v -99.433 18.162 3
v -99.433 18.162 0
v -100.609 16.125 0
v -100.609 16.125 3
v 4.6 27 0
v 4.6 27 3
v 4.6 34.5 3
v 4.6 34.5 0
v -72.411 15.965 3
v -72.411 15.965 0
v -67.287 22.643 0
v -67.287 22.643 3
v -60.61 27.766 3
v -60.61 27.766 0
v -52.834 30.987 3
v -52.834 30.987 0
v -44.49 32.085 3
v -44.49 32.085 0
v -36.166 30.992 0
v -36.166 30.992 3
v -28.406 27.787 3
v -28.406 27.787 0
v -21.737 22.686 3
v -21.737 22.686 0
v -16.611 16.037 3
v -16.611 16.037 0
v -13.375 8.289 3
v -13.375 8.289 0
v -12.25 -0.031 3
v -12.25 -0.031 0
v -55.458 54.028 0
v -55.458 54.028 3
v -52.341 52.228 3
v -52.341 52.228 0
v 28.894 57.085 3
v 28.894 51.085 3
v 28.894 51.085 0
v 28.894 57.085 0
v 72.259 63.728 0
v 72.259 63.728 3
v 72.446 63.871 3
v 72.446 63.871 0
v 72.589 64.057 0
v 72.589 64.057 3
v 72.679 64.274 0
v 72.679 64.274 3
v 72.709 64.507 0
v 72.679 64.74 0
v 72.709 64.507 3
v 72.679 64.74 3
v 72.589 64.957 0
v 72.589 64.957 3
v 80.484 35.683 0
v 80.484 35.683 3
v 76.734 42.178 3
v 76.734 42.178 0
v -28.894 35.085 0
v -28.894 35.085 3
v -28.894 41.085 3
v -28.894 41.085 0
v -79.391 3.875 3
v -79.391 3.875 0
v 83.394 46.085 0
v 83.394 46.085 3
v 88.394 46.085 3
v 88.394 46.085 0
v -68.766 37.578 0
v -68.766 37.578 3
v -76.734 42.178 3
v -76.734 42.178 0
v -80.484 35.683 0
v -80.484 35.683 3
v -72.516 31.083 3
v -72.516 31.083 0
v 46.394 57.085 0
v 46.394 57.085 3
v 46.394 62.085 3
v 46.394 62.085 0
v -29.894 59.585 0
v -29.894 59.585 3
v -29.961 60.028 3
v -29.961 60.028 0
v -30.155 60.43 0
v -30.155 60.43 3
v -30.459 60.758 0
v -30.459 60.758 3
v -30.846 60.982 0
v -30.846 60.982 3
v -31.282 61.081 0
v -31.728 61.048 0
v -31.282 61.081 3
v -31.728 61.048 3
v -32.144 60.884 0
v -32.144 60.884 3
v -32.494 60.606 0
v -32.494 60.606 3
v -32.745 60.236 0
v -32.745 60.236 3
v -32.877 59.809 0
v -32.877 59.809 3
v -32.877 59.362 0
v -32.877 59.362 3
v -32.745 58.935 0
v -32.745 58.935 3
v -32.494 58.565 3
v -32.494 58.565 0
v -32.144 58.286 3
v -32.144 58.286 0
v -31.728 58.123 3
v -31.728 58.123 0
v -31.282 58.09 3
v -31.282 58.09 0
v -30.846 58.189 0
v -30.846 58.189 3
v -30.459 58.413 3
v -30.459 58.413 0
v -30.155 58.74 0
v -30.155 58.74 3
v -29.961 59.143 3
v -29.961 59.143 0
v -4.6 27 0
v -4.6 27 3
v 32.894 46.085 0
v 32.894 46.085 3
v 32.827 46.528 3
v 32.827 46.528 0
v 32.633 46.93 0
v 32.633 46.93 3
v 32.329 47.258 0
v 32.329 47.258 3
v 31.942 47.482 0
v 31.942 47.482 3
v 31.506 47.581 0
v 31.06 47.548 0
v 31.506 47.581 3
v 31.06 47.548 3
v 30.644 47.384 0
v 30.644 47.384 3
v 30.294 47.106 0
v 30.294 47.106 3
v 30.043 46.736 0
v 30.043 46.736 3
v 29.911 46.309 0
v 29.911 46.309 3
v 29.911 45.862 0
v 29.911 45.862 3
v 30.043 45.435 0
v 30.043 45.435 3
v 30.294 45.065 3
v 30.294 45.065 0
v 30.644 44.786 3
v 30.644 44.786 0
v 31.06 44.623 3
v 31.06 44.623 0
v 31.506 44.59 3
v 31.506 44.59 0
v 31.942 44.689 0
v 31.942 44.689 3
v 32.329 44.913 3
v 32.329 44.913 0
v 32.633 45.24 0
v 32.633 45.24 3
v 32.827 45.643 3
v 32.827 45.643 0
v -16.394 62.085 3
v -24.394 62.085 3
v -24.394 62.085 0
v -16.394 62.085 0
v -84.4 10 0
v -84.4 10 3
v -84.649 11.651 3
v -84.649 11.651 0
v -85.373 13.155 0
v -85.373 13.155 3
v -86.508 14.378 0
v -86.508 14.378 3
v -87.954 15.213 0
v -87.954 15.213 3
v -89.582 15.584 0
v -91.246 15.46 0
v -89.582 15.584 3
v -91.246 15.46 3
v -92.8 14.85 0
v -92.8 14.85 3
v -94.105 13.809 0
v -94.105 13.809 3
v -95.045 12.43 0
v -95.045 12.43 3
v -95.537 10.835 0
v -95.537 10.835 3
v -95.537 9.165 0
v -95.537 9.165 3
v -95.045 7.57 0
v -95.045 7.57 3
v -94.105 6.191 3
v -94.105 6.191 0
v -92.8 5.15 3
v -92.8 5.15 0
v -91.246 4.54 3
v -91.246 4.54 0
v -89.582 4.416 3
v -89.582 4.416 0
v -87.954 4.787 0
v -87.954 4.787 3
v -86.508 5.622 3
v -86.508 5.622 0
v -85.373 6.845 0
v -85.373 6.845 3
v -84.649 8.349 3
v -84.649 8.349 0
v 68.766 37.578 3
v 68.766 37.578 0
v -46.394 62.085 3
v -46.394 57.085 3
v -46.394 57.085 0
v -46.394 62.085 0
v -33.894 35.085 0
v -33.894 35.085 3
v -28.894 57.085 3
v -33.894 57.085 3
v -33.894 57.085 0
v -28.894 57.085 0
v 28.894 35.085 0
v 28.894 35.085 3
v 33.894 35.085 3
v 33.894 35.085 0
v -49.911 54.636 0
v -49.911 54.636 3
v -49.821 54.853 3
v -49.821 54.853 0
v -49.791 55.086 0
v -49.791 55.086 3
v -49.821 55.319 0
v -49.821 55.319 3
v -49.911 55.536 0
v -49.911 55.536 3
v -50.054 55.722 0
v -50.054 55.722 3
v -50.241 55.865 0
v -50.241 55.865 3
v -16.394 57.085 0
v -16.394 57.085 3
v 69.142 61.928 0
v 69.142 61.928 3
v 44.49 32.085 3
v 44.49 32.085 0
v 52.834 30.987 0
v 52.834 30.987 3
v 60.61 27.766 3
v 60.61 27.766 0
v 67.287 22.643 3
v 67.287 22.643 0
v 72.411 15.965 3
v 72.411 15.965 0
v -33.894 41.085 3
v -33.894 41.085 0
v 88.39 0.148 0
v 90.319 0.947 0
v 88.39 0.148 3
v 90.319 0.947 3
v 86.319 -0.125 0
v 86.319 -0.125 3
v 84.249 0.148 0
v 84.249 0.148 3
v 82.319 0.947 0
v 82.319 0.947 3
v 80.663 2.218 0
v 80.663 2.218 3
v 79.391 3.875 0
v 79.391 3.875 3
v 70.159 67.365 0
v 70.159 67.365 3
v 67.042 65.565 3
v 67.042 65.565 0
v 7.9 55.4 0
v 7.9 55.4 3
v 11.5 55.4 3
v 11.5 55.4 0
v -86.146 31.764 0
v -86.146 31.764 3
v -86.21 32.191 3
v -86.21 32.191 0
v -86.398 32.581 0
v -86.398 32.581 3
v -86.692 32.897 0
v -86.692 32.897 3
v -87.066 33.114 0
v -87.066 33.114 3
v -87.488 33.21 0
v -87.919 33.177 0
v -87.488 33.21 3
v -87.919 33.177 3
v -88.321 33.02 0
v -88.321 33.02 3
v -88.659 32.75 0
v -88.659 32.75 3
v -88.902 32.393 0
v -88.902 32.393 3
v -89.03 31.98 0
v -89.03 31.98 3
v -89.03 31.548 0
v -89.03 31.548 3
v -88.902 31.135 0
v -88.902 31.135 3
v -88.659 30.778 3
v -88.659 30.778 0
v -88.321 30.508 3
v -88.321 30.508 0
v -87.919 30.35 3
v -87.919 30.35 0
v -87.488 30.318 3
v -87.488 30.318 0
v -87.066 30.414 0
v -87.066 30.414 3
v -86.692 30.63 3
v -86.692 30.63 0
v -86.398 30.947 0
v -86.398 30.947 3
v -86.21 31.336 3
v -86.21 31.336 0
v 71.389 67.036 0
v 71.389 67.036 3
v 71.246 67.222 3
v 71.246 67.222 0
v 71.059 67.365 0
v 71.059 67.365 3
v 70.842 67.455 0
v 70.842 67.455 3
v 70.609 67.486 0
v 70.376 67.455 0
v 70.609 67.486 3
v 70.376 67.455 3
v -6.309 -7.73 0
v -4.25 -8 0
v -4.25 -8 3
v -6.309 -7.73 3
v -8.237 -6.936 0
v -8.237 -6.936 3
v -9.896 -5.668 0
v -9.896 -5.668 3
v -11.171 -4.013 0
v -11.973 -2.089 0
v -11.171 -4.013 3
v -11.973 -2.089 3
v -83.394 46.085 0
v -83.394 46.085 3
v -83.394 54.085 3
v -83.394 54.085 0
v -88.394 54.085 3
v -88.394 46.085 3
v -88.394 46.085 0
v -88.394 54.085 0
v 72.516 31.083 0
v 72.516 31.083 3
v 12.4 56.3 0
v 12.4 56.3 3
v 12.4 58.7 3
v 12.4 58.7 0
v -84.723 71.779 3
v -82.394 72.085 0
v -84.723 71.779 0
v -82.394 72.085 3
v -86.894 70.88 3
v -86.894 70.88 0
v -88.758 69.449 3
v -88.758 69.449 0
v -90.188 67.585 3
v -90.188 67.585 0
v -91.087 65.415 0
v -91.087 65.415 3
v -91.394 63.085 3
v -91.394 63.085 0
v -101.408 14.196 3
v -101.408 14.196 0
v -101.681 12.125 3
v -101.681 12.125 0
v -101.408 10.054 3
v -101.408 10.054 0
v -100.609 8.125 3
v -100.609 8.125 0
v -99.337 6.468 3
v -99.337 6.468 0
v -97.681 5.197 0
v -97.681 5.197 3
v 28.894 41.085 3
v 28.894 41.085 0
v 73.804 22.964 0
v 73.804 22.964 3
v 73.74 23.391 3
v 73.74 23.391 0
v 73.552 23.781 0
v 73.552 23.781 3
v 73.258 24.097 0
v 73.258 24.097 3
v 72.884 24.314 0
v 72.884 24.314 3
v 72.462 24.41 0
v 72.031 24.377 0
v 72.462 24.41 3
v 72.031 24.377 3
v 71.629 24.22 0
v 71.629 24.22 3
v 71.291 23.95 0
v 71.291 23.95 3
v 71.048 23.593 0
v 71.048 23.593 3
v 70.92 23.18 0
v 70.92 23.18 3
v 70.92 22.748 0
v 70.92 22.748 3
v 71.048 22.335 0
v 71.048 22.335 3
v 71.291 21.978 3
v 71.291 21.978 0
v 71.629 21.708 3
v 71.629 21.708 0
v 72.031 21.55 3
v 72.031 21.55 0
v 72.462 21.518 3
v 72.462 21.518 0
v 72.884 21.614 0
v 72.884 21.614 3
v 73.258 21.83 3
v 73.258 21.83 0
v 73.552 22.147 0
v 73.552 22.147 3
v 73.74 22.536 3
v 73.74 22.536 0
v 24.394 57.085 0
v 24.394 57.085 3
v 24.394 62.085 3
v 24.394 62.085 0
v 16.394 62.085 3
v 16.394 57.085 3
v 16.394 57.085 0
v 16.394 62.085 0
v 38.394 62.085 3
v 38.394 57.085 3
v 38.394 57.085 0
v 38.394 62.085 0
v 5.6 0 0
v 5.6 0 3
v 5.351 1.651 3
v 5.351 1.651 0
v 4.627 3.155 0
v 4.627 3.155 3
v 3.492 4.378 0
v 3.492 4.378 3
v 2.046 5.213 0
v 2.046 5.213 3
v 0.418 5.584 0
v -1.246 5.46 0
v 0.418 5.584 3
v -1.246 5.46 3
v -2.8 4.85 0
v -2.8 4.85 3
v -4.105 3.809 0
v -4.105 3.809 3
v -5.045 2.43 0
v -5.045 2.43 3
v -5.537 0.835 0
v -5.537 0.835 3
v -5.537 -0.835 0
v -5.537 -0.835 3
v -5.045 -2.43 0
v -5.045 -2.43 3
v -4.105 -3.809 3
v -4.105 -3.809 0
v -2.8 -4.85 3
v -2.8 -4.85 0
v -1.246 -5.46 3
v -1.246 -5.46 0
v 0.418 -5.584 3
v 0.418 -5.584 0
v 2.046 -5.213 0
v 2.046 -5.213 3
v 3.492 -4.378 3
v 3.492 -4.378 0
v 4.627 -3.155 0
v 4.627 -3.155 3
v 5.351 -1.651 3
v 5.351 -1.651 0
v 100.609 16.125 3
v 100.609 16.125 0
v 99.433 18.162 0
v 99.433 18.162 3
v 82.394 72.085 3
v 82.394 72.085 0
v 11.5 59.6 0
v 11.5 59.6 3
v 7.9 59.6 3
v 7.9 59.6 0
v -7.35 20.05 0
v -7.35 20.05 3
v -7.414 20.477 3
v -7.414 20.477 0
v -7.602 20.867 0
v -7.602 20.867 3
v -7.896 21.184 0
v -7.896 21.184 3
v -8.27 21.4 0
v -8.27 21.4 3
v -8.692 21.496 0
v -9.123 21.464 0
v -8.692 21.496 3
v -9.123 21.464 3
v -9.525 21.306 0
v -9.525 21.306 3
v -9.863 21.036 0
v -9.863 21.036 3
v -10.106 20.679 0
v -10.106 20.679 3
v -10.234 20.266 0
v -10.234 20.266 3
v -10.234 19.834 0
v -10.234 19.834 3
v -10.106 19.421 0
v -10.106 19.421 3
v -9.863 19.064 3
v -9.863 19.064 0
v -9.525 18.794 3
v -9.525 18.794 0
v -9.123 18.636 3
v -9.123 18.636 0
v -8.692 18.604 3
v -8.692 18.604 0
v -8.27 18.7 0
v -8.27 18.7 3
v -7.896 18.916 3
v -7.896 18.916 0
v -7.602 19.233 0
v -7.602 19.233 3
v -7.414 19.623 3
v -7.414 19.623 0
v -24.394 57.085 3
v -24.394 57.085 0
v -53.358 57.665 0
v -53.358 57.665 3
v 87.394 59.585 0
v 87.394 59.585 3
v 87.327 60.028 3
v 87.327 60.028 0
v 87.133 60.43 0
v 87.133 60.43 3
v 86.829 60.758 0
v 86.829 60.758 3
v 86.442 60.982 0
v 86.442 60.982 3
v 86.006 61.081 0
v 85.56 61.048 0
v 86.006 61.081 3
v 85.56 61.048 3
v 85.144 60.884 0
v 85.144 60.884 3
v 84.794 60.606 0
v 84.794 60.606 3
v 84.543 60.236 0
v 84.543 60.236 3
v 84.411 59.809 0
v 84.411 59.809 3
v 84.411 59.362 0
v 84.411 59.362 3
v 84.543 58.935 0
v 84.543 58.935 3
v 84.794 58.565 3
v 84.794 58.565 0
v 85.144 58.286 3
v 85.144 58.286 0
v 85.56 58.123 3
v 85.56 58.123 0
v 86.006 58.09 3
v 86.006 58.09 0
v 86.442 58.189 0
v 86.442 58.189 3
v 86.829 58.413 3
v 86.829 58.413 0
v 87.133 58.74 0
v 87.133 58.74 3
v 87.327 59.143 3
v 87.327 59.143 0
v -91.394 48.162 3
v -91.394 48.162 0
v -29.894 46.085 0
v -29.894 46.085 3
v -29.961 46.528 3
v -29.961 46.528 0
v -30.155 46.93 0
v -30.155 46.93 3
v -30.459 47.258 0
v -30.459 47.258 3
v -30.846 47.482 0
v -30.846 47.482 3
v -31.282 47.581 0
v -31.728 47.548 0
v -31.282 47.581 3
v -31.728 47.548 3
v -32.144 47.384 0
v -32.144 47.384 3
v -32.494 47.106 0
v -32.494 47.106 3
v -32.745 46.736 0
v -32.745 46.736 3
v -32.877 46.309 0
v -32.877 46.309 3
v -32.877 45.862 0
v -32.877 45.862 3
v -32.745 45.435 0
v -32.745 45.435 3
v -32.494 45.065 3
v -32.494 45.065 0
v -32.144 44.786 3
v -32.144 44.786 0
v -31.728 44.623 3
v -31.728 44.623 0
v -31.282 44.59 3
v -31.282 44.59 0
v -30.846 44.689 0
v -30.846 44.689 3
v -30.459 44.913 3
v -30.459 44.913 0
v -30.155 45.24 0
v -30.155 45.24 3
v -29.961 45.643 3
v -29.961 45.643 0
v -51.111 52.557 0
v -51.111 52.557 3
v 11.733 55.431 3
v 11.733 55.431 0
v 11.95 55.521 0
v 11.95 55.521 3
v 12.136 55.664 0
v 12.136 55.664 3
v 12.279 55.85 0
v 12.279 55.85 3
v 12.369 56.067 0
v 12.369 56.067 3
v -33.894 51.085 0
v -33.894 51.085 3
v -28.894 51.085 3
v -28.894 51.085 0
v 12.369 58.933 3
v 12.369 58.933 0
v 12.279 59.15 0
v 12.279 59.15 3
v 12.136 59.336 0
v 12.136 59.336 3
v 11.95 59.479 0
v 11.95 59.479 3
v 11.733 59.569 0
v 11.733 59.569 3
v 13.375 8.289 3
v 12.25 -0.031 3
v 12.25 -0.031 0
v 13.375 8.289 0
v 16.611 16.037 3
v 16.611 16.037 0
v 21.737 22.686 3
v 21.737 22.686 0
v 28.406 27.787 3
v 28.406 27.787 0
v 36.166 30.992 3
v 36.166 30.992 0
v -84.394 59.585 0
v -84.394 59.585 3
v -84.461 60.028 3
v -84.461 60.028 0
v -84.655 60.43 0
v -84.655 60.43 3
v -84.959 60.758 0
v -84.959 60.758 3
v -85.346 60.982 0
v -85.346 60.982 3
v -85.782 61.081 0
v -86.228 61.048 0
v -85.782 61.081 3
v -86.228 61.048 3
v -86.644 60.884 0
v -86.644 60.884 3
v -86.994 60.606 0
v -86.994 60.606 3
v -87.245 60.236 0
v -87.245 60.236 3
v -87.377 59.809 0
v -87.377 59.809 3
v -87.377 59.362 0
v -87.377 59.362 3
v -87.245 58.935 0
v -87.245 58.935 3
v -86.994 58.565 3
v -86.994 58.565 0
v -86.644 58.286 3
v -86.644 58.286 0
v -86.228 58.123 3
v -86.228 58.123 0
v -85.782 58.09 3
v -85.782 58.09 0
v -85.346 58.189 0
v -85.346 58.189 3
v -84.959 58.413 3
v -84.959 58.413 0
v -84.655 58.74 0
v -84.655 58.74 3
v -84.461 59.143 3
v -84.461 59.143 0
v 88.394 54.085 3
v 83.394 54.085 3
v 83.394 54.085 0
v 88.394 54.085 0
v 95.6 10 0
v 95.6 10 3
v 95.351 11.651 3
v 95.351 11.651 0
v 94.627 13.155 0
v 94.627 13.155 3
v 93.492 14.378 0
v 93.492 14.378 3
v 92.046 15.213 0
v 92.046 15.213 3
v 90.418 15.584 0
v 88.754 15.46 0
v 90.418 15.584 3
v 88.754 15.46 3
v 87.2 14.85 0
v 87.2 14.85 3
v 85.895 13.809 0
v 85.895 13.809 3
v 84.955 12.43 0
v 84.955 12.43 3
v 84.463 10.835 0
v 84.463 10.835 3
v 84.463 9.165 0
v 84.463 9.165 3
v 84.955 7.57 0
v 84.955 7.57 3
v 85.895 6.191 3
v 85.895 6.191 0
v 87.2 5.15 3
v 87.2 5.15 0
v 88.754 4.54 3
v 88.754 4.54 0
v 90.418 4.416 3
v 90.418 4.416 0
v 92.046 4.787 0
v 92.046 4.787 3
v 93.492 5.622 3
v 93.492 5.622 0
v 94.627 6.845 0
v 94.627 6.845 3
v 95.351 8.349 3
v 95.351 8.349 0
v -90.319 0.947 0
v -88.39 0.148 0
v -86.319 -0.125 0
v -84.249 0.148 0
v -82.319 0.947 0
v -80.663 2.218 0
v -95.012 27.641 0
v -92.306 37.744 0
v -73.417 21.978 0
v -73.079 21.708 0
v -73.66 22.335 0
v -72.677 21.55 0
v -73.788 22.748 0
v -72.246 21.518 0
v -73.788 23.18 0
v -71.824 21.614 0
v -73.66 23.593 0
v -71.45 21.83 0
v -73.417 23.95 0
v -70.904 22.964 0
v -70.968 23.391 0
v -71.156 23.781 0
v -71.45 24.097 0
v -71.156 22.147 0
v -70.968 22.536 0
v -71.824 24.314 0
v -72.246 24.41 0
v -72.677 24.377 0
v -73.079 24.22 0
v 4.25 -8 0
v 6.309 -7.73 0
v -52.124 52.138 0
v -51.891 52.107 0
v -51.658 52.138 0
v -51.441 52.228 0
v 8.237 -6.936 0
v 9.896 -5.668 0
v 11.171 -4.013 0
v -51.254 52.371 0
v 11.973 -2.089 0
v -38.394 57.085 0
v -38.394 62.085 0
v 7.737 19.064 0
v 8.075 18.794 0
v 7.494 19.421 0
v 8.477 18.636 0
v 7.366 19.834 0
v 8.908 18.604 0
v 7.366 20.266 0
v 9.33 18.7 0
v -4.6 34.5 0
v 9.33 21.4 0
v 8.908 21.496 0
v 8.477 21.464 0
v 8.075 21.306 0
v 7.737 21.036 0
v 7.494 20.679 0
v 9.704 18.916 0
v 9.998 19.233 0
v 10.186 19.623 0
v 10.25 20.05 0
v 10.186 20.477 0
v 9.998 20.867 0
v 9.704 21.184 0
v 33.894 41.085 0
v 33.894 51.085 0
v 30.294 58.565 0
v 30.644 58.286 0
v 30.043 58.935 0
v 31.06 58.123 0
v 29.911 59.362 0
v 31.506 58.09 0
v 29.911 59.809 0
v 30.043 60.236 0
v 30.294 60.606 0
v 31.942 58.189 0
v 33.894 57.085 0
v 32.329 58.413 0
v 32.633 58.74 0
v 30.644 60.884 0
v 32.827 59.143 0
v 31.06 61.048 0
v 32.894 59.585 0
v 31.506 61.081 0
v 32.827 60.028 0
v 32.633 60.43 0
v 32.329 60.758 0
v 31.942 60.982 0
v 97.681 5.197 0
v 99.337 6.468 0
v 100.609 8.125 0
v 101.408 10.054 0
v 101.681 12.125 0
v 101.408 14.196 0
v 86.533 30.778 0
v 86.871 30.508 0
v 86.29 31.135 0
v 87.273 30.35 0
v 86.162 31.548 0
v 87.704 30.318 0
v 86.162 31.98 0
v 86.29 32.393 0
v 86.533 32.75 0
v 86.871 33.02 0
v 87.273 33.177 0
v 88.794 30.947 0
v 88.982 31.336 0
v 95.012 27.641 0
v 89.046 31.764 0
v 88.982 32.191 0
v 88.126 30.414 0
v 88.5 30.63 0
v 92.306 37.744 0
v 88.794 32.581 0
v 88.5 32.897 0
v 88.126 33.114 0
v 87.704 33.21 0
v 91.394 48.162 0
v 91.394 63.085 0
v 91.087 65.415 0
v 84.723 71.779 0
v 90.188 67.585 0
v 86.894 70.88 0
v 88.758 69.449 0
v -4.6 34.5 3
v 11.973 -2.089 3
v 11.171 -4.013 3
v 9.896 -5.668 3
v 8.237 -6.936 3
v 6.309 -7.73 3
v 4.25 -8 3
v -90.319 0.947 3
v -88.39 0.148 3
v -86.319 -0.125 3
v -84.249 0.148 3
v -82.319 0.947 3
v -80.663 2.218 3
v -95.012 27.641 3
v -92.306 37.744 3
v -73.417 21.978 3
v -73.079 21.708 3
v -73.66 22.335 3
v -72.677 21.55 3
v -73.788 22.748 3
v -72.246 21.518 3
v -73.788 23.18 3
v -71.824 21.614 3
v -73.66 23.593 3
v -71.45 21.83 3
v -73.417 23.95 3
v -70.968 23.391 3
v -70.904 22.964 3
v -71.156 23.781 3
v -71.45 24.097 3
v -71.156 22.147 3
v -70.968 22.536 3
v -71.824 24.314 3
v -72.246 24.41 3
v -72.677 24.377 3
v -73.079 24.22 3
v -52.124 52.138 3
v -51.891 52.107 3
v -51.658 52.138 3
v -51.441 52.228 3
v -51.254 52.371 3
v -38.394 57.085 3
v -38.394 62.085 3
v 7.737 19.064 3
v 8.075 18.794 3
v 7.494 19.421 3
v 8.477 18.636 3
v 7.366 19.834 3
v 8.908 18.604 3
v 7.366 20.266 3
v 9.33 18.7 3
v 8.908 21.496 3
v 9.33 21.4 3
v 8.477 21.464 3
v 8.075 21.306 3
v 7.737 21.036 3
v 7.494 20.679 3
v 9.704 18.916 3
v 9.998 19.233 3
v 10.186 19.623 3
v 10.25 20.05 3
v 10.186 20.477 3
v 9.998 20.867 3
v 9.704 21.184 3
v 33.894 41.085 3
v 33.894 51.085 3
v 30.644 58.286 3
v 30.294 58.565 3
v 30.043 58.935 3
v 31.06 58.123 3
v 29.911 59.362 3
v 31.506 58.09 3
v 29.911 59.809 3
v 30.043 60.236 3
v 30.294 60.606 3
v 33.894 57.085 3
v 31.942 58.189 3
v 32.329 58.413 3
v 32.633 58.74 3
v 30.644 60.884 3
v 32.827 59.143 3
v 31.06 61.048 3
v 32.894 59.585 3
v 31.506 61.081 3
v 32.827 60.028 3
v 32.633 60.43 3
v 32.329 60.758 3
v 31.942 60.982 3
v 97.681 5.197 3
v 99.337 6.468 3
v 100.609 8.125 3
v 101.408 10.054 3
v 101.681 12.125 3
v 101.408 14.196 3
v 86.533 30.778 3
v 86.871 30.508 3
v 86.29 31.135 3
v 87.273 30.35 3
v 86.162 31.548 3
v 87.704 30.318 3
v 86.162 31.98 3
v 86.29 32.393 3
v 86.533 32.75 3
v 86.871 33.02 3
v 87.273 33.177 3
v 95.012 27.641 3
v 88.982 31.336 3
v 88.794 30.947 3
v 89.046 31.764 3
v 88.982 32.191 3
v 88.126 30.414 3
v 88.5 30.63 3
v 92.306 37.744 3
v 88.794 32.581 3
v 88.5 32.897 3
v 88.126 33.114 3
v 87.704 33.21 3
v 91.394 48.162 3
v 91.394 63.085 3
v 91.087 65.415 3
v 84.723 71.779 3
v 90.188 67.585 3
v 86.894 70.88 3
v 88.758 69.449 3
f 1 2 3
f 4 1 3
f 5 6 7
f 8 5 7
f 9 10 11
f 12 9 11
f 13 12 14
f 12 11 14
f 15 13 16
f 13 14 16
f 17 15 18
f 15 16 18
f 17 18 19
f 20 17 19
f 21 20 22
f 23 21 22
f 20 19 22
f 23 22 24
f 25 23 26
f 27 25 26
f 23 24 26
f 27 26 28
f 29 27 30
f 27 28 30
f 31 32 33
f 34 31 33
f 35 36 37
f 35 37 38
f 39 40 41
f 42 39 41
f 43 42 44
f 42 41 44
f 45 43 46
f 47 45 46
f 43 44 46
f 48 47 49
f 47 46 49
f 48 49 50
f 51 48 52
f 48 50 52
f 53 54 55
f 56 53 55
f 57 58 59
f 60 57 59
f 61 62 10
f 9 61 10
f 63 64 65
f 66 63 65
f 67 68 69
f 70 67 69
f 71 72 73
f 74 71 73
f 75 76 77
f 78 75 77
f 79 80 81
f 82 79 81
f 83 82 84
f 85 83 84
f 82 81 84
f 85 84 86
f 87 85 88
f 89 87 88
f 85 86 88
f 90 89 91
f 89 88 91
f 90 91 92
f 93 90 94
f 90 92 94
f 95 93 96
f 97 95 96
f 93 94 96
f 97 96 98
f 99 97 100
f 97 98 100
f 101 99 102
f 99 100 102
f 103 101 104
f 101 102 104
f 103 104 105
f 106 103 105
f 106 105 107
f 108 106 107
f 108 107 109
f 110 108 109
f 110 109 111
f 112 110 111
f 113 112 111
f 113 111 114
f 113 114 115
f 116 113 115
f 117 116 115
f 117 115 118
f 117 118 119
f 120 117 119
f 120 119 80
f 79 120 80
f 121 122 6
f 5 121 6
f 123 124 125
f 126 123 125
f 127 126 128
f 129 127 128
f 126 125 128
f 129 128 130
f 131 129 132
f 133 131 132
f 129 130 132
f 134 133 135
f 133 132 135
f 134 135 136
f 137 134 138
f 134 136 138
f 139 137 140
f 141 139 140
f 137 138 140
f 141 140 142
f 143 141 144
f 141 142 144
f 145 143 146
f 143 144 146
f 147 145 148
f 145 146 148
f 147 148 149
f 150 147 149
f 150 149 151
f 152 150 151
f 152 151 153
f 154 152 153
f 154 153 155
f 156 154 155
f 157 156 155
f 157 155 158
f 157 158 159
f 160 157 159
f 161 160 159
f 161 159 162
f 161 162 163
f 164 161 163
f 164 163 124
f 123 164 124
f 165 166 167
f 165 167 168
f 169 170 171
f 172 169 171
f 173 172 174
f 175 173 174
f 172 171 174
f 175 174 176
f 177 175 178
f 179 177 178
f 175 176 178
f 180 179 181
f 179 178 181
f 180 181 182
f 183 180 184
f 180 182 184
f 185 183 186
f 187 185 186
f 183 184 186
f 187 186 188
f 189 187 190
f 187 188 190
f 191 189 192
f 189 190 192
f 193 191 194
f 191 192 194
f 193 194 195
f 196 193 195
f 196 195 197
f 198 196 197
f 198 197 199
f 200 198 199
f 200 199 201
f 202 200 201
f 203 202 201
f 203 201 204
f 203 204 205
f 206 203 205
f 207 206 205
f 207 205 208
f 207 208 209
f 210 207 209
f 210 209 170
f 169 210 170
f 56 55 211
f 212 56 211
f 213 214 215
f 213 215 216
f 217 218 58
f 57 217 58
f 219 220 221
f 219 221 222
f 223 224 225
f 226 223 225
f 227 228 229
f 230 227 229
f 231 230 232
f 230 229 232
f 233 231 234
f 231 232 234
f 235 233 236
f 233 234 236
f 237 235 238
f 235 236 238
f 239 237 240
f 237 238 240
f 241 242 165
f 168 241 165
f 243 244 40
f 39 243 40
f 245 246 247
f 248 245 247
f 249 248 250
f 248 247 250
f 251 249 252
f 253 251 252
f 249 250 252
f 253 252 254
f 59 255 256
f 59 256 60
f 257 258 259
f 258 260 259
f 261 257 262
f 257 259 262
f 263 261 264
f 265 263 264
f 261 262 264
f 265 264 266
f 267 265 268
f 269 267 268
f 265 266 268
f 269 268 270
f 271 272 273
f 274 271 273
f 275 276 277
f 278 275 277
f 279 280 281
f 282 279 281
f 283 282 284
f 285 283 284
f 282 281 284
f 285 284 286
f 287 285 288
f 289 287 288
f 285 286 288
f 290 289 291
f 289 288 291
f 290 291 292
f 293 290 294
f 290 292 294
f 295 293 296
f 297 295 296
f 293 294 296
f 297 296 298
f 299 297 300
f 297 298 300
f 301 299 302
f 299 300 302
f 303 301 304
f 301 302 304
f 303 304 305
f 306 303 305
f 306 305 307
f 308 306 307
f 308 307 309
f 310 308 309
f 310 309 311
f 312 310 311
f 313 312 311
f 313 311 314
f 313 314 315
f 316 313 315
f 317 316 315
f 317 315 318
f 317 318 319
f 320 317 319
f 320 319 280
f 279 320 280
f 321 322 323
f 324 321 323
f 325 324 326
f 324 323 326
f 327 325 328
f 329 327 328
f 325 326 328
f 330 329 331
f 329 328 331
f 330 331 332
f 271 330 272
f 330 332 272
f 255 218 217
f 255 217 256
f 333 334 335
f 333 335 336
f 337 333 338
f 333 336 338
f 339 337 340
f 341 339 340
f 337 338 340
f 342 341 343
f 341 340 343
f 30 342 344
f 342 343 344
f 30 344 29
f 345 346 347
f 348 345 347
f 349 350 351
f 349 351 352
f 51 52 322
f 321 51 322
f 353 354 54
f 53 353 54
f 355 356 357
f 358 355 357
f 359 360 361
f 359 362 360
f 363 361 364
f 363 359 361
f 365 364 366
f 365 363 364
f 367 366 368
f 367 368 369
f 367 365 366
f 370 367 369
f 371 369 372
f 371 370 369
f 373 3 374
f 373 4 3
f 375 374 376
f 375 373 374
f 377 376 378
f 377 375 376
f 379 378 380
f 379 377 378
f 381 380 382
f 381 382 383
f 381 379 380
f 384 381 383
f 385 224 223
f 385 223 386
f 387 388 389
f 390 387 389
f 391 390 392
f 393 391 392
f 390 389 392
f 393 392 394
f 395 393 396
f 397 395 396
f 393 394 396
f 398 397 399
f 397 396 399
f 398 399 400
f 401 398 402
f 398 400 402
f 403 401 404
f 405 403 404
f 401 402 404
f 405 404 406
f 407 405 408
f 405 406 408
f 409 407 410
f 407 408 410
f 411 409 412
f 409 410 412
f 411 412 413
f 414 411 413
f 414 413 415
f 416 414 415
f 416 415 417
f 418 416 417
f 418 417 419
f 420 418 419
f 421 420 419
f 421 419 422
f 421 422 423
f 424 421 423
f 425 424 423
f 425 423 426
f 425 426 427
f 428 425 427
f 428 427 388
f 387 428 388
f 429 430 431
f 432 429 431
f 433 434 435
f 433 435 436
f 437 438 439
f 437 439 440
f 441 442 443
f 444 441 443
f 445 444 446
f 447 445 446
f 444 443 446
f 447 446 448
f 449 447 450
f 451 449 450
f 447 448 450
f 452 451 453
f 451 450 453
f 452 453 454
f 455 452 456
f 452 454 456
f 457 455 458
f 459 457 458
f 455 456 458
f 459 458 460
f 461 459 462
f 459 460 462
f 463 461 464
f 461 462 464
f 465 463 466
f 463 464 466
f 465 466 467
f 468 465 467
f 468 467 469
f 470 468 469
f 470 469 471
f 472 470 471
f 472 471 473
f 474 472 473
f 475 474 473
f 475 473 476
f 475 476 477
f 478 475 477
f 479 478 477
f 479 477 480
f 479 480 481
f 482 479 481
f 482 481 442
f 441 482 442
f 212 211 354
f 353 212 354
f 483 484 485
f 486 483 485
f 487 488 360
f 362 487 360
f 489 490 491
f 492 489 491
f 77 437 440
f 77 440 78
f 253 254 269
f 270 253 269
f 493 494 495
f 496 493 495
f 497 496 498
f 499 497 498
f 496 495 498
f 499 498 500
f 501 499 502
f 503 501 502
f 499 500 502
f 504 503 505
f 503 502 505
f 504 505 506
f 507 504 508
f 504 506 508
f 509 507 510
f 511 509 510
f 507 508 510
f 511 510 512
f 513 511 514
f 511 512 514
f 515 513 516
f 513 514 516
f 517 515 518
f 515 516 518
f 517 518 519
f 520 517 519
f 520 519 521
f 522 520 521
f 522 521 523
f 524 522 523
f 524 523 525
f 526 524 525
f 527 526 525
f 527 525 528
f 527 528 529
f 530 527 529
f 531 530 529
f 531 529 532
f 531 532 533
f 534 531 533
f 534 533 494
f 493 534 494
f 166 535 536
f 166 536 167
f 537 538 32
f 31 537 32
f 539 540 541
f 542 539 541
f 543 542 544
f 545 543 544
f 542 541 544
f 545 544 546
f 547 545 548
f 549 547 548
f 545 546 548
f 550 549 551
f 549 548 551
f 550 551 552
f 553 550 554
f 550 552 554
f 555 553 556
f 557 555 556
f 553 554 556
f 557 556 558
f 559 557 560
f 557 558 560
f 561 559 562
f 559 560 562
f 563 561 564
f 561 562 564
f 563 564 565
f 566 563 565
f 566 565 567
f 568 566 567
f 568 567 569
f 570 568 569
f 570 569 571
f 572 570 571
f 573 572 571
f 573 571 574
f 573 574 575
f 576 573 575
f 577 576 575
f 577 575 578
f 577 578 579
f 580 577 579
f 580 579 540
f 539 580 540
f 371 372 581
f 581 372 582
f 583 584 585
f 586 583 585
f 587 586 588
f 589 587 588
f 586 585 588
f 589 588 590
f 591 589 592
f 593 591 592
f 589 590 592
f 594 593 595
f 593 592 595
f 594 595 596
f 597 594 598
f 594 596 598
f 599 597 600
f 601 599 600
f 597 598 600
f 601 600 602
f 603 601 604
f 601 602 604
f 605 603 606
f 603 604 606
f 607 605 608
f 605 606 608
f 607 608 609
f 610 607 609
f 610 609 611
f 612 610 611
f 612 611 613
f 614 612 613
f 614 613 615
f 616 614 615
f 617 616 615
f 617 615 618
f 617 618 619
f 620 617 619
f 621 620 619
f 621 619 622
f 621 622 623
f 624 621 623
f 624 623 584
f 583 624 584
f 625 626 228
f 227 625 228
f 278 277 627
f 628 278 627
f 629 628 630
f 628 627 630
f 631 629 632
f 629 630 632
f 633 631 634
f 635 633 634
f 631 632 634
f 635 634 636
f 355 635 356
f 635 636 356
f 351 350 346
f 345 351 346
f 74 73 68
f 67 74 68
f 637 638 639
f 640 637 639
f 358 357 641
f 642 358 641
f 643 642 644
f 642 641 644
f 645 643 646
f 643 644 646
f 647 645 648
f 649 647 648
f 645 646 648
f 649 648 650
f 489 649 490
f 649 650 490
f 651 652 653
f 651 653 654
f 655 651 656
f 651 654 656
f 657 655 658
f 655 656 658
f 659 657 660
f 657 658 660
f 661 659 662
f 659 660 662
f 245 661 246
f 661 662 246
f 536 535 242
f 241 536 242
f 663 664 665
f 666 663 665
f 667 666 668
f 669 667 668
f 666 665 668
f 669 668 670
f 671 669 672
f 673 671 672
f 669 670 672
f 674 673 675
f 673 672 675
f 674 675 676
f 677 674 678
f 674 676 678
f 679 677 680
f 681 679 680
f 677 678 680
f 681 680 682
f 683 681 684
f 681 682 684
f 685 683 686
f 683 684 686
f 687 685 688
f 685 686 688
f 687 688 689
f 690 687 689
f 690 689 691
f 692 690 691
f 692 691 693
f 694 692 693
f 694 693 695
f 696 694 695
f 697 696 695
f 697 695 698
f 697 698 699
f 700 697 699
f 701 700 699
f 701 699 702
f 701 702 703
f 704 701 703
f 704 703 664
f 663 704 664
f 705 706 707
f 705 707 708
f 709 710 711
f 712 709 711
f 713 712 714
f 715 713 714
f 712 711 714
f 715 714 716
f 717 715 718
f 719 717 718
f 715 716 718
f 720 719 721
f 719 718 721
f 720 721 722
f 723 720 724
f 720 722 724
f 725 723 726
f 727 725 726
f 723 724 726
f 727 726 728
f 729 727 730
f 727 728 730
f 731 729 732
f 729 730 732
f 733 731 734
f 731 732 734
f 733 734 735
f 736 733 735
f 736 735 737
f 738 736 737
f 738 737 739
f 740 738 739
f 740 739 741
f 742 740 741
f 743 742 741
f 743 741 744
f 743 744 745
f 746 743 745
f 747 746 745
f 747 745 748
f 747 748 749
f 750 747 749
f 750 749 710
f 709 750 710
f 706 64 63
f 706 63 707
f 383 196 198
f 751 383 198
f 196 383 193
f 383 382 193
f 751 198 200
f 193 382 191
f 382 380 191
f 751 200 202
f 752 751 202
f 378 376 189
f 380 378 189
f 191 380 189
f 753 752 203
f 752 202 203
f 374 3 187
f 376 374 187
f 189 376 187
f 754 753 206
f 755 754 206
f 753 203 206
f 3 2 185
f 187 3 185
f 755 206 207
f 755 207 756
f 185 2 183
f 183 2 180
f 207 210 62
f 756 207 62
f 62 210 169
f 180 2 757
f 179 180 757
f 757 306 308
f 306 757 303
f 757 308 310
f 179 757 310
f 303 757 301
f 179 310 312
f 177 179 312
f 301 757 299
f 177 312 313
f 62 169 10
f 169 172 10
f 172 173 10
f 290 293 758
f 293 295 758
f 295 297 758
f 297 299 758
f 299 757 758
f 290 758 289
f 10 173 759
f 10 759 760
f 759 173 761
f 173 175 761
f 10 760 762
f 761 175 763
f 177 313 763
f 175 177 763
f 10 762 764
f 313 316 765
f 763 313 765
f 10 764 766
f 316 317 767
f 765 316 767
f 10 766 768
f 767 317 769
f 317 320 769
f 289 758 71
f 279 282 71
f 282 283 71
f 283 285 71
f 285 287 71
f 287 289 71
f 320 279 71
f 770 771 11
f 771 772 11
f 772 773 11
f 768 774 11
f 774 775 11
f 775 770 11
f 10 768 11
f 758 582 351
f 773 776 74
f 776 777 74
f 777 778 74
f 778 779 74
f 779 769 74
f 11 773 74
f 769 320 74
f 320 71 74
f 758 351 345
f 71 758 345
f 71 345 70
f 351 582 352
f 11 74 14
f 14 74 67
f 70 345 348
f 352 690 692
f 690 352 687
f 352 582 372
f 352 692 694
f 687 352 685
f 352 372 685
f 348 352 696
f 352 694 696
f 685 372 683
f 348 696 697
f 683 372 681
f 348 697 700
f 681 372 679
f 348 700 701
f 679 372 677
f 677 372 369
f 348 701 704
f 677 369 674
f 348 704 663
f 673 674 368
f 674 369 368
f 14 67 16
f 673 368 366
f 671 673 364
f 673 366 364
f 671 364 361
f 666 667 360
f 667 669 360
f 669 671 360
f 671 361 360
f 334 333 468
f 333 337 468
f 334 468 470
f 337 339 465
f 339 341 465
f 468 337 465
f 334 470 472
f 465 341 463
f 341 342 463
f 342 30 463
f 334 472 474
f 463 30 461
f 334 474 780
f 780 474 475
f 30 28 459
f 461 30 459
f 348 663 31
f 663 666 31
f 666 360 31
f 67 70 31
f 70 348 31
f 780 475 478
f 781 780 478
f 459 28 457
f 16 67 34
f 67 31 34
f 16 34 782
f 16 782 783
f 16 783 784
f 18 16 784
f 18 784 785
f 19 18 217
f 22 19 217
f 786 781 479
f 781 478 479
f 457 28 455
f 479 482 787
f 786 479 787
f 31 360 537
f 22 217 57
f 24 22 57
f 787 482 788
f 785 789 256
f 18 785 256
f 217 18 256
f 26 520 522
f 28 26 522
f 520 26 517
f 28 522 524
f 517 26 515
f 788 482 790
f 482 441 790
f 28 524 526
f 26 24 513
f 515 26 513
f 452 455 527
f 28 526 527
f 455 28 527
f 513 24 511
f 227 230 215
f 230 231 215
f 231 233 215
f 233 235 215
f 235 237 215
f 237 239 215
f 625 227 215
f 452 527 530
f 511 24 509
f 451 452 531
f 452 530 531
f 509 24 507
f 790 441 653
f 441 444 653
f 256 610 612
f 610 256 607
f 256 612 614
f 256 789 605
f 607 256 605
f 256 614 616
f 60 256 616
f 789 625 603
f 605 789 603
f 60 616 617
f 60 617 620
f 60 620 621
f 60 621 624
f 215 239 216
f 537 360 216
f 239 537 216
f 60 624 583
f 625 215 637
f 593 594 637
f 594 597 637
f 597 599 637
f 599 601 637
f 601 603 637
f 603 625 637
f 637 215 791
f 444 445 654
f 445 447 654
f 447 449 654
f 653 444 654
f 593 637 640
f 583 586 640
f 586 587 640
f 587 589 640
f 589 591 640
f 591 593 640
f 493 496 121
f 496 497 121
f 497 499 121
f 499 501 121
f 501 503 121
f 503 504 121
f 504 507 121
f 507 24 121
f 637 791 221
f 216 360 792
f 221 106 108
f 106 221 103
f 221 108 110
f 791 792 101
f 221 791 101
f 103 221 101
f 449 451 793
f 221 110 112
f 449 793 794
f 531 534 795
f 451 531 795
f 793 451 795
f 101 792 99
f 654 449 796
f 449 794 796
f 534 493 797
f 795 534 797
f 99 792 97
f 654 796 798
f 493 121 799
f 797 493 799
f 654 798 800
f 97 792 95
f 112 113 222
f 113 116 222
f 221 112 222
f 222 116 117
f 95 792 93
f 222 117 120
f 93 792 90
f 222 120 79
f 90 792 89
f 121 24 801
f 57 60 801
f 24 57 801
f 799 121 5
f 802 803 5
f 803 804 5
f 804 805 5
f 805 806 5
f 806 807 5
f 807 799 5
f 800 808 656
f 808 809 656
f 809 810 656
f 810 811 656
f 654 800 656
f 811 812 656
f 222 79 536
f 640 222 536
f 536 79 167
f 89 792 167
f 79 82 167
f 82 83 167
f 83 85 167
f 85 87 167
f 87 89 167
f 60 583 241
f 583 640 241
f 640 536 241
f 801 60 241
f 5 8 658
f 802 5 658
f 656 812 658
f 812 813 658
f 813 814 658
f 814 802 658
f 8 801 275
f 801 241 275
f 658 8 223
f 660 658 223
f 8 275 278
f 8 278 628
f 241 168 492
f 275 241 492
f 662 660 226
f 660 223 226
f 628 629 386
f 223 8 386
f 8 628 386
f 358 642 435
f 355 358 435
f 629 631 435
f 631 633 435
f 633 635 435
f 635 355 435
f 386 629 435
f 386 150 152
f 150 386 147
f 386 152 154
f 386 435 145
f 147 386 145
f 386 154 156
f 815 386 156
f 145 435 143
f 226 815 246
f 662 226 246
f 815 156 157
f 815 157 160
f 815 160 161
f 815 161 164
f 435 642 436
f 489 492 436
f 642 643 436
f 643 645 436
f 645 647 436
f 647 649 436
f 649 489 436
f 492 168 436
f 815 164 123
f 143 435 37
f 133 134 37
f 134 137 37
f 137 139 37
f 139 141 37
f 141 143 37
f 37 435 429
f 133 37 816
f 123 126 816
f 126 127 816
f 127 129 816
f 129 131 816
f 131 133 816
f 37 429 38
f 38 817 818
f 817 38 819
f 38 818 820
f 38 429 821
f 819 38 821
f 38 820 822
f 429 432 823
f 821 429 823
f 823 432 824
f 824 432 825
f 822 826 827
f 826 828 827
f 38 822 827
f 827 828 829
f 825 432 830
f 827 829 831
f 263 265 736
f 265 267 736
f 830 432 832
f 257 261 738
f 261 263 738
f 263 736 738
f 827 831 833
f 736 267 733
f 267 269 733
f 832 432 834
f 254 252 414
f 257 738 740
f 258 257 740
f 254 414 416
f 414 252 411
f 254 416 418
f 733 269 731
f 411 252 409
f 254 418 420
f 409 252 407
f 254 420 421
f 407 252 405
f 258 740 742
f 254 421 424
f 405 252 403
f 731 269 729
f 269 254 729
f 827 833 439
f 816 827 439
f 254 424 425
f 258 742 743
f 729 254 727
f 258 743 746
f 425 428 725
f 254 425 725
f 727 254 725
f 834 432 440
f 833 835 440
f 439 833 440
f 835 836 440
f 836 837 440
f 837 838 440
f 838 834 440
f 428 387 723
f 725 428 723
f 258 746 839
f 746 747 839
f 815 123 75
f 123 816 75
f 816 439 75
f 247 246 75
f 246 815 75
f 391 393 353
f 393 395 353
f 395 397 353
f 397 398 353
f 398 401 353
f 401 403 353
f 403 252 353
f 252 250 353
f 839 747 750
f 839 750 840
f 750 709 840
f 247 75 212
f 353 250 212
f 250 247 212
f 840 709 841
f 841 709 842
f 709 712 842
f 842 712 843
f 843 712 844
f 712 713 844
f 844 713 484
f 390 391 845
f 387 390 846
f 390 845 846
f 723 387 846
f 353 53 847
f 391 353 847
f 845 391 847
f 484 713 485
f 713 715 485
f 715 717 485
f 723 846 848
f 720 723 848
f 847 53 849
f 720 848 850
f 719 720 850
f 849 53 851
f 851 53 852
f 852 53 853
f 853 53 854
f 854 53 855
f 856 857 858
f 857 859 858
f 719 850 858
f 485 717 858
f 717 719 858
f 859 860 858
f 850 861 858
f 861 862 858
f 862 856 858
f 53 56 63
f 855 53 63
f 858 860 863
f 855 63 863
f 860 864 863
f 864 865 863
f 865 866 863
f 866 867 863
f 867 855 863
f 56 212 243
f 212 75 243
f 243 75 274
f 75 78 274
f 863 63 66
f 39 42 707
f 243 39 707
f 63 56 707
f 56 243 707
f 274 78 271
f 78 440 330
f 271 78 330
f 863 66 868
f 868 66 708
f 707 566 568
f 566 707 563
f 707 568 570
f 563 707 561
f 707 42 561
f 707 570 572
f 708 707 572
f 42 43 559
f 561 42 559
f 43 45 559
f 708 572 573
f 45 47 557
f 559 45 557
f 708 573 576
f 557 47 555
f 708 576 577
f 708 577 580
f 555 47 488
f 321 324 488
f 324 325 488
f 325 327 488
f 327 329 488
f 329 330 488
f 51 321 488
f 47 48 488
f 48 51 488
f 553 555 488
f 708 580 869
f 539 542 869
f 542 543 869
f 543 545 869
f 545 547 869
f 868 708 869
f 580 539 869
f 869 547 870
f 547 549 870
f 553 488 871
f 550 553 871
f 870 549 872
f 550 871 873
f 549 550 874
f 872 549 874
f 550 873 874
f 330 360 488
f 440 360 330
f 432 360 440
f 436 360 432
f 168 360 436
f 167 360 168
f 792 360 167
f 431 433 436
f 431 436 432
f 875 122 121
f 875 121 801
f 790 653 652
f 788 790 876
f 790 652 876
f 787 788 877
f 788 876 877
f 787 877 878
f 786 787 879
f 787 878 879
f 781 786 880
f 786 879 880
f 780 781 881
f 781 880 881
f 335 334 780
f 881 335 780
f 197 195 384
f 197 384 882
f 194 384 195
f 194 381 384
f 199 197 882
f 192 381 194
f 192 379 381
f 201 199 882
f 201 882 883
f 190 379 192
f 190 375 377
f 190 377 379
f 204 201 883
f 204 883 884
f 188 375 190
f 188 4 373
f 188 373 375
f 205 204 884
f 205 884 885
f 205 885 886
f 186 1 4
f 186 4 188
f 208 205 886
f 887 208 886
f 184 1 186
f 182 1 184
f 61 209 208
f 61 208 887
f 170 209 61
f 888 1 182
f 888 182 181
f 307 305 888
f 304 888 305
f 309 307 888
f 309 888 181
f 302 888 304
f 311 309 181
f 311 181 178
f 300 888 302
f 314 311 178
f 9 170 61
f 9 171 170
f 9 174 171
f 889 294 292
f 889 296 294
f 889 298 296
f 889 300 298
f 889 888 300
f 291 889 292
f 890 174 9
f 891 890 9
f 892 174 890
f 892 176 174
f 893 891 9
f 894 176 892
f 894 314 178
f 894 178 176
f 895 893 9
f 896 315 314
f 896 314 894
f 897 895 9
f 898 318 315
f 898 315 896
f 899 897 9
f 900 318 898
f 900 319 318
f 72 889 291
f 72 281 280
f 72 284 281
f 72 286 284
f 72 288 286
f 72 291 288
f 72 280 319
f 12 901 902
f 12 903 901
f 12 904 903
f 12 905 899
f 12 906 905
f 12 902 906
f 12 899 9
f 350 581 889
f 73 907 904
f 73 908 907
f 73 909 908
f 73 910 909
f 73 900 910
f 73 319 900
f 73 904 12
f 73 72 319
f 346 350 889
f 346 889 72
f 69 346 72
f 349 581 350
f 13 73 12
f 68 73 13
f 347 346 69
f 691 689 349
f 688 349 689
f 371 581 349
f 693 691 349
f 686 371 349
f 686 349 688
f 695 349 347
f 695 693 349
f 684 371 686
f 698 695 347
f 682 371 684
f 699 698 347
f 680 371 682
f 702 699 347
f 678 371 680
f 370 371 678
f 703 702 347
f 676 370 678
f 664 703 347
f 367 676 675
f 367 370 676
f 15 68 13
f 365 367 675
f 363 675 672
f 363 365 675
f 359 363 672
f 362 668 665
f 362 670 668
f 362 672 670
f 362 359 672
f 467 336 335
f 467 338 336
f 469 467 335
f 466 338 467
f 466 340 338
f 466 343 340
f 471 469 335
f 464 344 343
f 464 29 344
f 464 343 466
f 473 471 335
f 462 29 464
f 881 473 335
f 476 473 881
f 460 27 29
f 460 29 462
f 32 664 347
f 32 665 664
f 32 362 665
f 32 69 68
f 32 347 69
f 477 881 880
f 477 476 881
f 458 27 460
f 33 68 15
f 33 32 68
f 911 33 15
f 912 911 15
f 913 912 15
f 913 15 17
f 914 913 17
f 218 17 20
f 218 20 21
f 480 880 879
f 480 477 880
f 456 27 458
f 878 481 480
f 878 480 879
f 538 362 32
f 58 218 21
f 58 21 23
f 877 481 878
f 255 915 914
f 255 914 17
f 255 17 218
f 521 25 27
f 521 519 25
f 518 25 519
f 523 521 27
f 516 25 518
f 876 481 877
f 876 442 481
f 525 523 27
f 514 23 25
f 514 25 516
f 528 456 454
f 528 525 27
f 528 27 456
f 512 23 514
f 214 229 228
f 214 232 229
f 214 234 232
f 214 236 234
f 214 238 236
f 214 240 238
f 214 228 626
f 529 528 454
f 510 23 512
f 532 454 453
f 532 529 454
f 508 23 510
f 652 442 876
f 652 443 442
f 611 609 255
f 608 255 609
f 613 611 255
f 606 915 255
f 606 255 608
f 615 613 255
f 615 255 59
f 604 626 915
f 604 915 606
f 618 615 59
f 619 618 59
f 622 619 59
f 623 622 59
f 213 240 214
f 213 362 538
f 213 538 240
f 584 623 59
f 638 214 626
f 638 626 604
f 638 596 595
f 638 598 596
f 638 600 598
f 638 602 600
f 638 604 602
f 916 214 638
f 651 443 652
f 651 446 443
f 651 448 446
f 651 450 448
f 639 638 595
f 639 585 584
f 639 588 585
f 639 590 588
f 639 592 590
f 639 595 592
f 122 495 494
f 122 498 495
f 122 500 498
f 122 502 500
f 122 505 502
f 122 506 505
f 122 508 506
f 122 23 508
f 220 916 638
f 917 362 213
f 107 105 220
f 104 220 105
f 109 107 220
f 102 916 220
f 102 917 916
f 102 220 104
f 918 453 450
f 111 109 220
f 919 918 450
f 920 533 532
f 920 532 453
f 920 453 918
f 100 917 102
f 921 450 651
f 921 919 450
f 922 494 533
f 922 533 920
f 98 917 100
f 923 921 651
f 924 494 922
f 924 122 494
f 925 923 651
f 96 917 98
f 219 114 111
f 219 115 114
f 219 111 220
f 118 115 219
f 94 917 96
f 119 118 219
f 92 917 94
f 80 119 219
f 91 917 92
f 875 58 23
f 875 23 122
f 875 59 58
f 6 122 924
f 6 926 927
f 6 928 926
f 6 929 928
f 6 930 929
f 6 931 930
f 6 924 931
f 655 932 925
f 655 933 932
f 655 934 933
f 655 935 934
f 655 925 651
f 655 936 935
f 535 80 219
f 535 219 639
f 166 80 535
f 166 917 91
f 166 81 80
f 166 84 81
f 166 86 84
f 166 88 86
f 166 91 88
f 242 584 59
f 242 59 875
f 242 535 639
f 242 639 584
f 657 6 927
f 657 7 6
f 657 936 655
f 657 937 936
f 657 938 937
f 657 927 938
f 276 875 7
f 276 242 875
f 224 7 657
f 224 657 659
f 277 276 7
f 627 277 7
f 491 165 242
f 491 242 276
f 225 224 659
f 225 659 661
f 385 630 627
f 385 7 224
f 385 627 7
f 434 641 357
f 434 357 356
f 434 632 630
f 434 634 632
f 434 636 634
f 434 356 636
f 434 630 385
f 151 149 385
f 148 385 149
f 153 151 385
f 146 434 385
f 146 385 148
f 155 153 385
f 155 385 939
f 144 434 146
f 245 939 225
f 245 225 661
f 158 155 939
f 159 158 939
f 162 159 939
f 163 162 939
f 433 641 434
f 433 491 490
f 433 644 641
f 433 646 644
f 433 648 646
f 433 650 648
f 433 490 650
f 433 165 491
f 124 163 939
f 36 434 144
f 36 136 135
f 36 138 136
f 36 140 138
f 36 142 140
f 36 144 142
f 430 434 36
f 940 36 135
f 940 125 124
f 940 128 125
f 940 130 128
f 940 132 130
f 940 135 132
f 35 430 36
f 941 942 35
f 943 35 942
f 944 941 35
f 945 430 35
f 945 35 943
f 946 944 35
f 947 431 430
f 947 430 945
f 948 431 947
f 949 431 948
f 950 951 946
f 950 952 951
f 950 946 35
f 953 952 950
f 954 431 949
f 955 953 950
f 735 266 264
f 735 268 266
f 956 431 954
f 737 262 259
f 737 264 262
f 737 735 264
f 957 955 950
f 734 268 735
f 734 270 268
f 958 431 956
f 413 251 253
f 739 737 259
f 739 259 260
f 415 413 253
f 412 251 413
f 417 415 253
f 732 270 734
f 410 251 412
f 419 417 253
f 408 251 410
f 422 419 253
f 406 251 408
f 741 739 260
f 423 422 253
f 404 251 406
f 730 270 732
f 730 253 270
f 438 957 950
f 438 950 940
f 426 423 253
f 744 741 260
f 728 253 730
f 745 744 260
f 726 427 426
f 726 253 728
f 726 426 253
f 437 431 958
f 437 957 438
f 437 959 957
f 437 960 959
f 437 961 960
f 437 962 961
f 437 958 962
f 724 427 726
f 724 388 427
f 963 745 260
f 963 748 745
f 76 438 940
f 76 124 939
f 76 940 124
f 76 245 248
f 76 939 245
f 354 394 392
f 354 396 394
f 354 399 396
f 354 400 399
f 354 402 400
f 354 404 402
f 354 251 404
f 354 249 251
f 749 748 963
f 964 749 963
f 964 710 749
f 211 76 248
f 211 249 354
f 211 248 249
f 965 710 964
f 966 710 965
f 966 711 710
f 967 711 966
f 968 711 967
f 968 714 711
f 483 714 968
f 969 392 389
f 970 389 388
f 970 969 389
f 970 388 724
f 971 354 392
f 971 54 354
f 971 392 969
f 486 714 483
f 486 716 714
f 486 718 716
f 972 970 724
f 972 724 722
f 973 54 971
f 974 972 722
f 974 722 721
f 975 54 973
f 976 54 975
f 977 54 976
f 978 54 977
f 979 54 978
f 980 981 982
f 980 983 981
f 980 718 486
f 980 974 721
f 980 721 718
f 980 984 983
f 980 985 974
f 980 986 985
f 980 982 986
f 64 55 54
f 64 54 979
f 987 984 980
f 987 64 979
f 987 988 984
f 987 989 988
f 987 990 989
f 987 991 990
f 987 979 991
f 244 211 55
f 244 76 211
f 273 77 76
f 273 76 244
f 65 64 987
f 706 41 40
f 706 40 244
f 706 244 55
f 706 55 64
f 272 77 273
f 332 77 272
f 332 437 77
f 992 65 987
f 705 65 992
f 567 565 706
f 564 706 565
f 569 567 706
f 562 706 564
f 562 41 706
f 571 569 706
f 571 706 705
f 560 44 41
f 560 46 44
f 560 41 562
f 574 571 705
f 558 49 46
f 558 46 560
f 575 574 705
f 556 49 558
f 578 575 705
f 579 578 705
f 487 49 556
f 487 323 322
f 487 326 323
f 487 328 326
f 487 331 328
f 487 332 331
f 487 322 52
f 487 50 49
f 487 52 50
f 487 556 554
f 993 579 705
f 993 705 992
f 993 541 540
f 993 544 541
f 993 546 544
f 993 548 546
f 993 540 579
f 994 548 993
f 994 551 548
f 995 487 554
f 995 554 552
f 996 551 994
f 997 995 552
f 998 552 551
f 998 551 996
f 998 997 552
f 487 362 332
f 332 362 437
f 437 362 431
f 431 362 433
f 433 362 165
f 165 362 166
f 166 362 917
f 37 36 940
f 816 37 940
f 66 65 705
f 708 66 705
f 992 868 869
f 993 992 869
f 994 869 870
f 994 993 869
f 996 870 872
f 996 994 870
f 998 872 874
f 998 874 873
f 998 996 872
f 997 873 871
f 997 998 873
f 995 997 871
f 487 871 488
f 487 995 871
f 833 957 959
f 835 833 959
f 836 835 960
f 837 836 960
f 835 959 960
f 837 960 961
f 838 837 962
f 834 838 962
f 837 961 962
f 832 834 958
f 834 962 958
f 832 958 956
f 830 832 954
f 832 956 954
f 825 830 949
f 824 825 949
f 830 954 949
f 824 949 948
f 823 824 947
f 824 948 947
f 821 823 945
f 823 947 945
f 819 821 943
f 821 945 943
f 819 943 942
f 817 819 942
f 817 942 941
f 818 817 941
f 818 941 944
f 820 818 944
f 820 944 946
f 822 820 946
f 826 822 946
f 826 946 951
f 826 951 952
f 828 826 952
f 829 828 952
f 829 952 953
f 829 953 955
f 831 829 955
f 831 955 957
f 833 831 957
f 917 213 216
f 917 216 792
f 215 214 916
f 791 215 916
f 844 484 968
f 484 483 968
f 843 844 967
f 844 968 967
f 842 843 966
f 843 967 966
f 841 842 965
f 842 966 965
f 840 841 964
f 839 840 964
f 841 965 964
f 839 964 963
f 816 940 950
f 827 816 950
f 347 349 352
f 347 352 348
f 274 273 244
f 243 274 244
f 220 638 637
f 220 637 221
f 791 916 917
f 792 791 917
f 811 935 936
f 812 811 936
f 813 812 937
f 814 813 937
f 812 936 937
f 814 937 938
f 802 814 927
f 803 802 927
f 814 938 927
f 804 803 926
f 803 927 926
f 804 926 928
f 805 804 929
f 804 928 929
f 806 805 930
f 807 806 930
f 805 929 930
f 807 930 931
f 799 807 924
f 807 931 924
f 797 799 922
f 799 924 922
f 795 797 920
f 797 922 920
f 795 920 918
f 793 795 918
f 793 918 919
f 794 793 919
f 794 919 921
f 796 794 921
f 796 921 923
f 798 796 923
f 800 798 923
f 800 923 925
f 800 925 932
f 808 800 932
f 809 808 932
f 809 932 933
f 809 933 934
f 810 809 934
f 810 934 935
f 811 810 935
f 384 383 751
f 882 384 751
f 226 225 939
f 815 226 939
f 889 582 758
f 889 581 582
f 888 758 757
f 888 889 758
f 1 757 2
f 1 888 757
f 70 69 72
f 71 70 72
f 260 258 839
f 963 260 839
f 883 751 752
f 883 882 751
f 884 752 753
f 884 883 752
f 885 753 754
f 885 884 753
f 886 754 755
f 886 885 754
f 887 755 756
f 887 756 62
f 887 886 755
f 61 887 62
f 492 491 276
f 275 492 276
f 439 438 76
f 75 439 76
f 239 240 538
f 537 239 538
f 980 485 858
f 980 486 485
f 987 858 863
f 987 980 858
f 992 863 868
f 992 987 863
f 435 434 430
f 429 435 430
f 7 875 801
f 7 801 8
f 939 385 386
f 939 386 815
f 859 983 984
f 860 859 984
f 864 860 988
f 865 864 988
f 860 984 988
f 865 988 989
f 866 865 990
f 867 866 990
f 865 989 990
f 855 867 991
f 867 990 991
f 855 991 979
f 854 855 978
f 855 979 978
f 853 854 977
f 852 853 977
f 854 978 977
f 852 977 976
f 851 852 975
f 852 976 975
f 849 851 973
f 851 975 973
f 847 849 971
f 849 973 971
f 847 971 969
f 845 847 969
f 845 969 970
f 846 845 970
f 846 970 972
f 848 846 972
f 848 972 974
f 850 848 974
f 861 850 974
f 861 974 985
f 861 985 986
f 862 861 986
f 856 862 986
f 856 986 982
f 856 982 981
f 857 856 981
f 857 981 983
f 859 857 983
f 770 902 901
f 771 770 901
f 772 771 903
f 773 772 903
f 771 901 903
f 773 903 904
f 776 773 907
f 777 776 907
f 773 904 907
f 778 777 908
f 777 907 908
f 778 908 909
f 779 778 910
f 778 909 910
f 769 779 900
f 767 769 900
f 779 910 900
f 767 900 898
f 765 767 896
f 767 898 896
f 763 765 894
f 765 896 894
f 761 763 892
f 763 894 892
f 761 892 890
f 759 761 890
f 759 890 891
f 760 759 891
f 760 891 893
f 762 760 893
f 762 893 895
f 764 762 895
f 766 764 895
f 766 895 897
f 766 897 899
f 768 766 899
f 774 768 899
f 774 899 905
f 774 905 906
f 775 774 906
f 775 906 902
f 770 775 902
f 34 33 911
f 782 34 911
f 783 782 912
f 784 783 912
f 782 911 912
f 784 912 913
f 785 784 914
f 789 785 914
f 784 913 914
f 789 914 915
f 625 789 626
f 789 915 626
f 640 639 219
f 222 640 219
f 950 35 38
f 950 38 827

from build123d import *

# Parameters (mm, degrees)
BOSS_EXTRUDE1_DEPTH = 3
FILLET1_R           = 60
FILLET2_R           = 8
SKETCH3_R           = 1.45
SKETCH3_R_2         = 5.6
SKETCH3_W           = 9.2
SKETCH3_H           = 7.5
CUT_EXTRUDE1_DEPTH  = 125.676613305
SKETCH4_R           = 1.5
SKETCH4_W           = 8
SKETCH4_H           = 5
CUT_EXTRUDE2_DEPTH  = 125.676613305
SKETCH5_W           = 5
SKETCH5_H           = 8
CUT_EXTRUDE3_DEPTH  = 125.676613305
FILLET3_R           = 9
SKETCH6_R           = 1.5
SKETCH6_W           = 5
SKETCH6_H           = 6
CUT_EXTRUDE4_DEPTH  = 125.676613305


with BuildPart() as part:
    # Sketch1 → Boss-Extrude1 (new body)
    with BuildSketch(Plane.XY):
        Polygon((-83.391188804, -3.05320323), (-63.103878976, 32.08544814), (-12.25, 32.08544814), (-12.25, -8), (12.25, -8), (12.25, 32.08544814), (63.103878976, 32.08544814), (83.391188804, -3.05320323), (104.608811196, 9.19679677), (91.394042166, 32.08544814), (91.394042166, 72.08544814), (-91.394042166, 72.08544814), (-91.394042166, 32.08544814), (-104.608811196, 9.19679677), align=None)
        with BuildLine():
            ThreePointArc((-72.410784769, 15.965414445), (-60.610101085, 27.766098129), (-44.49006739, 32.08544814))
            Line((-44.49006739, 32.08544814), (-63.103878976, 32.08544814))
            Line((-63.103878976, 32.08544814), (-72.410784769, 15.965414445))
        make_face()
        with BuildLine():
            Line((-12.25, -0.15461925), (-12.25, 32.08544814))
            Line((-12.25, 32.08544814), (-44.49006739, 32.08544814))
            ThreePointArc((-44.49006739, 32.08544814), (-21.692897113, 22.642551027), (-12.25, -0.15461925))
        make_face()
        with BuildLine():
            Line((12.25, 32.08544814), (12.25, -0.15461925))
            ThreePointArc((12.25, -0.15461925), (21.692897113, 22.642551027), (44.49006739, 32.08544814))
            Line((44.49006739, 32.08544814), (12.25, 32.08544814))
        make_face()
        with BuildLine():
            Line((63.103878976, 32.08544814), (44.49006739, 32.08544814))
            ThreePointArc((44.49006739, 32.08544814), (60.610101085, 27.766098129), (72.410784769, 15.965414445))
            Line((72.410784769, 15.965414445), (63.103878976, 32.08544814))
        make_face()
    extrude(amount=BOSS_EXTRUDE1_DEPTH)

    # Fillet1
    fillet1_edges = [part.edges().sort_by_distance(p)[0] for p in [
        (-91.394042166, 32.08544814, 1.5),
        (91.394042166, 32.08544814, 1.5),
    ]]
    fillet(fillet1_edges, radius=FILLET1_R)

    # Fillet2
    fillet2_edges = [part.edges().sort_by_distance(p)[0] for p in [
        (-104.608811196, 9.19679677, 1.5),
        (-83.391188804, -3.05320323, 1.5),
        (-12.25, -8, 1.5),
        (12.25, -8, 1.5),
        (83.391188804, -3.05320323, 1.5),
        (104.608811196, 9.19679677, 1.5),
    ]]
    fillet(fillet2_edges, radius=FILLET2_R)

    # Sketch3 → Cut-Extrude1 (cut, through all)
    with BuildSketch(Plane.XY.offset(3)):
        with Locations((87.596023553, 31.763809346)):
            Circle(SKETCH3_R)
        with Locations((72.353976447, 22.963809346)):
            Circle(SKETCH3_R)
        with Locations((8.8, 20.05)):
            Circle(SKETCH3_R)
        with Locations((-8.8, 20.05)):
            Circle(SKETCH3_R)
        with Locations((-87.596023553, 31.763809346)):
            Circle(SKETCH3_R)
        with Locations((-72.353976447, 22.963809346)):
            Circle(SKETCH3_R)
        Circle(SKETCH3_R_2)
        with Locations((-90, 10)):
            Circle(SKETCH3_R_2)
        with Locations((90, 10)):
            Circle(SKETCH3_R_2)
        with BuildLine():
            Line((-53.35839931, 57.665114066), (-55.45839931, 54.02780737))
            Line((-55.45839931, 54.02780737), (-52.340707856, 52.22780737))
            ThreePointArc((-52.340707856, 52.22780737), (-51.657770716, 52.137896989), (-51.111284993, 52.557230233))
            Line((-51.111284993, 52.557230233), (-49.911284993, 54.635691202))
            ThreePointArc((-49.911284993, 54.635691202), (-49.821374613, 55.318628343), (-50.240707856, 55.865114066))
            Line((-50.240707856, 55.865114066), (-53.35839931, 57.665114066))
        make_face()
        with BuildLine():
            Line((7.9, 59.6), (7.9, 55.4))
            Line((7.9, 55.4), (11.5, 55.4))
            ThreePointArc((11.5, 55.4), (12.136396103, 55.663603897), (12.4, 56.3))
            Line((12.4, 56.3), (12.4, 58.7))
            ThreePointArc((12.4, 58.7), (12.136396103, 59.336396103), (11.5, 59.6))
            Line((11.5, 59.6), (7.9, 59.6))
        make_face()
        with BuildLine():
            Line((67.04160069, 65.565114066), (69.14160069, 61.92780737))
            Line((69.14160069, 61.92780737), (72.259292144, 63.72780737))
            ThreePointArc((72.259292144, 63.72780737), (72.678625387, 64.274293092), (72.588715007, 64.957230233))
            Line((72.588715007, 64.957230233), (71.388715007, 67.035691202))
            ThreePointArc((71.388715007, 67.035691202), (70.842229284, 67.455024446), (70.159292144, 67.365114066))
            Line((70.159292144, 67.365114066), (67.04160069, 65.565114066))
        make_face()
        Polygon((-68.766283143, 37.577876431), (-76.733716857, 42.177876431), (-80.483716857, 35.682685902), (-72.516283143, 31.082685902), align=None)
        with Locations((0, 30.75)):
            Rectangle(SKETCH3_W, SKETCH3_H)
        Polygon((76.733716857, 42.177876431), (68.766283143, 37.577876431), (72.516283143, 31.082685902), (80.483716857, 35.682685902), align=None)
    extrude(amount=-CUT_EXTRUDE1_DEPTH, mode=Mode.SUBTRACT)

    # Sketch4 → Cut-Extrude2 (cut, through all)
    with BuildSketch(Plane.XY.offset(3)):
        with Locations((-31.394042166, 59.58544814)):
            Circle(SKETCH4_R)
        with Locations((31.394042166, 59.58544814)):
            Circle(SKETCH4_R)
        with Locations((-85.894042166, 59.58544814)):
            Circle(SKETCH4_R)
        with Locations((85.894042166, 59.58544814)):
            Circle(SKETCH4_R)
        with Locations((-42.394042166, 59.58544814)):
            Rectangle(SKETCH4_W, SKETCH4_H)
        with Locations((-20.394042166, 59.58544814)):
            Rectangle(SKETCH4_W, SKETCH4_H)
        with Locations((20.394042166, 59.58544814)):
            Rectangle(SKETCH4_W, SKETCH4_H)
        with Locations((42.394042166, 59.58544814)):
            Rectangle(SKETCH4_W, SKETCH4_H)
    extrude(amount=-CUT_EXTRUDE2_DEPTH, mode=Mode.SUBTRACT)

    # Sketch5 → Cut-Extrude3 (cut, through all)
    with BuildSketch(Plane.XY.offset(3)):
        with Locations((-85.894042166, 50.08544814)):
            Rectangle(SKETCH5_W, SKETCH5_H)
        with Locations((85.894042166, 50.08544814)):
            Rectangle(SKETCH5_W, SKETCH5_H)
    extrude(amount=-CUT_EXTRUDE3_DEPTH, mode=Mode.SUBTRACT)

    # Fillet3
    fillet3_edges = [part.edges().sort_by_distance(p)[0] for p in [
        (-91.394042166, 72.08544814, 1.5),
        (91.394042166, 72.08544814, 1.5),
    ]]
    fillet(fillet3_edges, radius=FILLET3_R)

    # Sketch6 → Cut-Extrude4 (cut, through all)
    with BuildSketch(Plane.XY.offset(3)):
        with Locations((-31.394042166, 46.08544814)):
            Circle(SKETCH6_R)
        with Locations((31.394042166, 46.08544814)):
            Circle(SKETCH6_R)
        with Locations((31.394042166, 38.08544814)):
            Rectangle(SKETCH6_W, SKETCH6_H)
        with Locations((31.394042166, 54.08544814)):
            Rectangle(SKETCH6_W, SKETCH6_H)
        with Locations((-31.394042166, 54.08544814)):
            Rectangle(SKETCH6_W, SKETCH6_H)
        with Locations((-31.394042166, 38.08544814)):
            Rectangle(SKETCH6_W, SKETCH6_H)
    extrude(amount=-CUT_EXTRUDE4_DEPTH, mode=Mode.SUBTRACT)


solid = part.part
